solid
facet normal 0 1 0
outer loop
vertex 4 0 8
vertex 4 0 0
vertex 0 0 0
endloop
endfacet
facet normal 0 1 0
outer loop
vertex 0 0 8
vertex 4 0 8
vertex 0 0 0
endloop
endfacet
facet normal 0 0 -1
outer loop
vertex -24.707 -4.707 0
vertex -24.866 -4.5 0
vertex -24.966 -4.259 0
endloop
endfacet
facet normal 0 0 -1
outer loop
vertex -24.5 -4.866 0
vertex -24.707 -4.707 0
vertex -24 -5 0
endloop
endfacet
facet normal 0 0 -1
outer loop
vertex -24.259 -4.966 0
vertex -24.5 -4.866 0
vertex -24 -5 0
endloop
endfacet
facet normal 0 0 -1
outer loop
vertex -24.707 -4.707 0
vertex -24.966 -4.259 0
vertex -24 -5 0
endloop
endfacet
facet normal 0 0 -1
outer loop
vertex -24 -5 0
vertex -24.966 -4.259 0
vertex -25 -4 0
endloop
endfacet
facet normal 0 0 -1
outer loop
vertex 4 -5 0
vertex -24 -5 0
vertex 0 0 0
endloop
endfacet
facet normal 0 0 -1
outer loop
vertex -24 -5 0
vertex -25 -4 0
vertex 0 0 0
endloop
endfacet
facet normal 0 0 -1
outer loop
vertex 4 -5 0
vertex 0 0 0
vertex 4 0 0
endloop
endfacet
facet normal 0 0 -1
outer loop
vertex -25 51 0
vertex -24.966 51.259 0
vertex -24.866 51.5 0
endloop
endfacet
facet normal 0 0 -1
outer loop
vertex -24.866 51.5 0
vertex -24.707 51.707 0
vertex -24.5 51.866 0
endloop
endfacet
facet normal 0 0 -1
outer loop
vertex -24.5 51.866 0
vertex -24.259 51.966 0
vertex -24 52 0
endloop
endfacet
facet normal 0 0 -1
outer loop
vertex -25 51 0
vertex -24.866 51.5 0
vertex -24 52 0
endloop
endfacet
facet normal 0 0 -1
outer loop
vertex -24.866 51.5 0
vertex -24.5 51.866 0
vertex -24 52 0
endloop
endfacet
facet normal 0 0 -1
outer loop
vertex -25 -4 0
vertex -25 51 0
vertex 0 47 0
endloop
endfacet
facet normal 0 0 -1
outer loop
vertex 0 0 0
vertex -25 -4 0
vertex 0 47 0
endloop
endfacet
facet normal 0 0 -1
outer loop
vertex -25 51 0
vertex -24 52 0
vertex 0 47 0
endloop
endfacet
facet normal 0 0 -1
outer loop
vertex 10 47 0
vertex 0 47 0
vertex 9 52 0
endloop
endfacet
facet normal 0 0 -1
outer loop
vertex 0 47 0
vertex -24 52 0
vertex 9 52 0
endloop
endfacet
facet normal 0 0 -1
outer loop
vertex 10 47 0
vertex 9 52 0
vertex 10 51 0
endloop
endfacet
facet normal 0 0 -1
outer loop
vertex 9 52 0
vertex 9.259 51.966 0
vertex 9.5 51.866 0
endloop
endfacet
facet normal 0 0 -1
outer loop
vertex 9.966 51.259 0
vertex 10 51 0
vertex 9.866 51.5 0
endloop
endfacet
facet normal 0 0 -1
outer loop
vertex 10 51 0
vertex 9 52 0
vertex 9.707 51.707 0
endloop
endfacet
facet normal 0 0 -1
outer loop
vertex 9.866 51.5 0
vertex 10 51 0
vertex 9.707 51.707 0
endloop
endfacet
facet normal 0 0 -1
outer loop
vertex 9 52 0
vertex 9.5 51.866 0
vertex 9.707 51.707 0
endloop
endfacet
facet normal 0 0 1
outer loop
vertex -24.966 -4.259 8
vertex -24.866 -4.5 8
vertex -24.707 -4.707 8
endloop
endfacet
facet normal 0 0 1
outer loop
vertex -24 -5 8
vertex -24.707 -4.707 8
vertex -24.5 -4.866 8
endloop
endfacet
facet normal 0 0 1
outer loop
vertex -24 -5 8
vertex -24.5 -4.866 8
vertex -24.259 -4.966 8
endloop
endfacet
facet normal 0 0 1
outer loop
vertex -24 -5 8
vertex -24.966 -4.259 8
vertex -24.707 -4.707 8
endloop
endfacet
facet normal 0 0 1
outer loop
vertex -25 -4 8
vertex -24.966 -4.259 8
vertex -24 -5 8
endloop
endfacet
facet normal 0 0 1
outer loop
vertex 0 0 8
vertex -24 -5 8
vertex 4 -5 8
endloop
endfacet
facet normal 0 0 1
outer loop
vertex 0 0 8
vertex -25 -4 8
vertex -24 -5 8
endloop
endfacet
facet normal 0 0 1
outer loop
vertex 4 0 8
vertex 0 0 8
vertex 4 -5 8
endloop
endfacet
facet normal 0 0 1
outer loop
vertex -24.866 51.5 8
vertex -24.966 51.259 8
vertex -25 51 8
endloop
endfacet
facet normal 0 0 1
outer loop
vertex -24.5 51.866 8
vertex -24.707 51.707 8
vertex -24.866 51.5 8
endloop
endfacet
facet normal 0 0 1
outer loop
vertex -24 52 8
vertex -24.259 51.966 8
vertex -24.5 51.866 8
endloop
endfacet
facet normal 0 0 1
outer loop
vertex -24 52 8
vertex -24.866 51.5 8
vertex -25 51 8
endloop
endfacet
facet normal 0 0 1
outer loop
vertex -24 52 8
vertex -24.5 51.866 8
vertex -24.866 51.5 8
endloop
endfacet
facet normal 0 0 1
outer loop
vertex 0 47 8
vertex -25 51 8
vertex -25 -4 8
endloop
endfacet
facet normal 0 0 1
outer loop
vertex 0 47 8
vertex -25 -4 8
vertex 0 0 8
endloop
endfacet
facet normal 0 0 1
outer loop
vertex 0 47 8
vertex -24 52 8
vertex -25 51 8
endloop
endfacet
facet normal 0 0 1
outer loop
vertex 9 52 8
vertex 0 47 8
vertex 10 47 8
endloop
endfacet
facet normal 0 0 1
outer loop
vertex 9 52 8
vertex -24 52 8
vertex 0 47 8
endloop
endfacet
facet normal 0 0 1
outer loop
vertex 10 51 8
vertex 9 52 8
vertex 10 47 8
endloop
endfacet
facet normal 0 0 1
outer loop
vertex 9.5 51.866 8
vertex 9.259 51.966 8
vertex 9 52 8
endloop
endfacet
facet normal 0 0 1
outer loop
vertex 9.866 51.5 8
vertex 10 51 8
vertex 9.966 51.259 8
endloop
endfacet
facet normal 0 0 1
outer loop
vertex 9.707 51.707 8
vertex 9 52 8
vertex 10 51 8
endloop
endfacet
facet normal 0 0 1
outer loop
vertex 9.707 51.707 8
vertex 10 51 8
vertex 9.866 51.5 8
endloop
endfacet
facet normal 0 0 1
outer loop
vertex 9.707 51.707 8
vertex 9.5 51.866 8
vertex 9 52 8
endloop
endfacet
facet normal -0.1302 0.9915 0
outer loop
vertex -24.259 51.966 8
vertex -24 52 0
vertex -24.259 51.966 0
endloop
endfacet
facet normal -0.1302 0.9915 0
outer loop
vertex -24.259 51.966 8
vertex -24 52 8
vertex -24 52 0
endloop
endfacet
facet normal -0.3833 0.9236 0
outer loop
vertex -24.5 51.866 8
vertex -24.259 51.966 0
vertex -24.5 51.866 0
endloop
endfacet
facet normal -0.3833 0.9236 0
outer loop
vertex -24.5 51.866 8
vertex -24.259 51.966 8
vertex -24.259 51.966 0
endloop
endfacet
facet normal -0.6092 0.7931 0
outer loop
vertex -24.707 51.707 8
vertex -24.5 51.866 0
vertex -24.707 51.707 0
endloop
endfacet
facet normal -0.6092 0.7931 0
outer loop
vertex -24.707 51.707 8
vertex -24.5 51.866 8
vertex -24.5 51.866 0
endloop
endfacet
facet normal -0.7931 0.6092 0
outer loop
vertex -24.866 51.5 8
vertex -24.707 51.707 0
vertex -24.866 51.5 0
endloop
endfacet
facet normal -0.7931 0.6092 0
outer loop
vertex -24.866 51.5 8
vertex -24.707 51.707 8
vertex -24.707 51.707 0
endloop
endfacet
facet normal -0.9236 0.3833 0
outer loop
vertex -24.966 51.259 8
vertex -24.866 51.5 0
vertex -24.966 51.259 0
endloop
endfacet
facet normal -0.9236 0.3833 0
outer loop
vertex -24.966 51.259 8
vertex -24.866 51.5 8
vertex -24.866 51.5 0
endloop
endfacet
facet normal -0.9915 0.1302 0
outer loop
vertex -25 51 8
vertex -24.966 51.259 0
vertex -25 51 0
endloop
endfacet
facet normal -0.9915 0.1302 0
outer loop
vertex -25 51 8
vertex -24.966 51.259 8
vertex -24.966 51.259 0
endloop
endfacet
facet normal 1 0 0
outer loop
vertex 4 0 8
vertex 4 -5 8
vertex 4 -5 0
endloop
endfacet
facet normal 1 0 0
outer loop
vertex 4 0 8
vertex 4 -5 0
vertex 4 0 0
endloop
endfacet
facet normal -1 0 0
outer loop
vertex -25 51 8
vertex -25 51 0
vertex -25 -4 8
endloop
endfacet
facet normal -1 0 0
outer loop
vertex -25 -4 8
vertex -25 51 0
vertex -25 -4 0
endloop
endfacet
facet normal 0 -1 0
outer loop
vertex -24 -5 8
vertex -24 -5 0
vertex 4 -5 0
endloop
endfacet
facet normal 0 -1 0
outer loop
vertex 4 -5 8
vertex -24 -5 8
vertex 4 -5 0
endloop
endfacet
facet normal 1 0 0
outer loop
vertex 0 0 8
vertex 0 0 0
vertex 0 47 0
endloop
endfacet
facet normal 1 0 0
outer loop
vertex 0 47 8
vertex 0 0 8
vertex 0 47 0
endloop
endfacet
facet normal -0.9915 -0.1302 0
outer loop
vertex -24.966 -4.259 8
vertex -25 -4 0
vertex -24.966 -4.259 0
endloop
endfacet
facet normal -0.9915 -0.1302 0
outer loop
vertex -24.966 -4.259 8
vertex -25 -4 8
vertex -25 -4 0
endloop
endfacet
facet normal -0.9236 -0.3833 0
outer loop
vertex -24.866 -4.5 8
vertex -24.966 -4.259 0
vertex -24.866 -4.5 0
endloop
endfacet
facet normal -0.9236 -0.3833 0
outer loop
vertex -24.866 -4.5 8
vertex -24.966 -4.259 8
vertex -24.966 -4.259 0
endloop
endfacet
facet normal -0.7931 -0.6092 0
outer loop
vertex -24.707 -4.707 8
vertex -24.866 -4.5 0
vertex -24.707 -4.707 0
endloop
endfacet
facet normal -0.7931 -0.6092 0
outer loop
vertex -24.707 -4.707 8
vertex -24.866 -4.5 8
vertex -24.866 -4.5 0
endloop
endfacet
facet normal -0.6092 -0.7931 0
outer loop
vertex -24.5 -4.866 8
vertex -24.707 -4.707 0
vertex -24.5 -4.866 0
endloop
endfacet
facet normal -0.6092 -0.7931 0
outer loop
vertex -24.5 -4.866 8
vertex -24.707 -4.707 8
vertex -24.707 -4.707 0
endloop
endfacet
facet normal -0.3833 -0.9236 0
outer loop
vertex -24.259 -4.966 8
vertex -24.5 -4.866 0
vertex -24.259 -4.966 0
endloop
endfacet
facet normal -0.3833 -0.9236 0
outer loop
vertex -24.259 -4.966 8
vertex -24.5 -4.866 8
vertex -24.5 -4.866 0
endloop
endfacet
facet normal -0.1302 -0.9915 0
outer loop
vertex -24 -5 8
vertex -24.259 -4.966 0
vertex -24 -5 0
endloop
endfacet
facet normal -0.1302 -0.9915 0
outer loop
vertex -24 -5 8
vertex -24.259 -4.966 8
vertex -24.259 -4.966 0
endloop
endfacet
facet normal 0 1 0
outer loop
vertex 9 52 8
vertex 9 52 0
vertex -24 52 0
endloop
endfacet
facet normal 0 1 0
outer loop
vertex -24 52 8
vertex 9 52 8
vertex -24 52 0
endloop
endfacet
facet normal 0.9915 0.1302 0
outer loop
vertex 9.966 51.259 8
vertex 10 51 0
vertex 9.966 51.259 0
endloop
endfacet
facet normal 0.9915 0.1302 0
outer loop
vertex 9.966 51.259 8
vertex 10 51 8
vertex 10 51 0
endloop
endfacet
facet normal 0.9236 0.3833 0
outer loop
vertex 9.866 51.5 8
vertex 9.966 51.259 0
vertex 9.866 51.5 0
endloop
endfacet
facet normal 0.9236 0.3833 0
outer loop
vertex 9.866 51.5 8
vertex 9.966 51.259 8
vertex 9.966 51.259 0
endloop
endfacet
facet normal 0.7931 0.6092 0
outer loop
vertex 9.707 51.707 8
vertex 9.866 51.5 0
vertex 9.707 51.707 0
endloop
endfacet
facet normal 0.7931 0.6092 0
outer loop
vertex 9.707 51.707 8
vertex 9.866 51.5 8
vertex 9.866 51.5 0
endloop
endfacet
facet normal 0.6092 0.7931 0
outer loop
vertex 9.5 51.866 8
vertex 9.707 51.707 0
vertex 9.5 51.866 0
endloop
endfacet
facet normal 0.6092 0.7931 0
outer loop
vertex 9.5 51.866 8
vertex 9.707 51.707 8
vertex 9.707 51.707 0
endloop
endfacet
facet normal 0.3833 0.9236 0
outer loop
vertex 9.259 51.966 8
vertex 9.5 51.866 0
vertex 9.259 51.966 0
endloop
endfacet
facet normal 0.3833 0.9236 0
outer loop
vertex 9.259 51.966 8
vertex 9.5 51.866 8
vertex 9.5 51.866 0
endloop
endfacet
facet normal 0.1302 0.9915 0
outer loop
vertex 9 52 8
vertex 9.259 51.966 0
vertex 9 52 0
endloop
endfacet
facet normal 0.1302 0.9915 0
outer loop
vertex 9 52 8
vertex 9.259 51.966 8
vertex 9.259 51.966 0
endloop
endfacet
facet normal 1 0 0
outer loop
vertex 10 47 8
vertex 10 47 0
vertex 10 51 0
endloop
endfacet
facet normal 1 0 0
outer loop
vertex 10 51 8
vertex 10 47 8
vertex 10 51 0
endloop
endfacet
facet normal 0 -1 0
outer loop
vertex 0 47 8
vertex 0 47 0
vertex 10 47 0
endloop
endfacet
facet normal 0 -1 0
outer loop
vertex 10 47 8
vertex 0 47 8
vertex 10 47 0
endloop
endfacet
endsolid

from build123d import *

# Parameters (mm, degrees)
PAD_DEPTH = 8
FILLET_R  = 1


with BuildPart() as part:
    # Sketch → Pad (new body)
    with BuildSketch(Plane.XY):
        Polygon((0, 0), (0, 47), (10, 47), (10, 52), (-25, 52), (-25, -5), (4, -5), (4, 0), align=None)
    extrude(amount=PAD_DEPTH)

    # Fillet
    fillet_edges = [part.edges().sort_by_distance(p)[0] for p in [
        (-25, 52, 4),
        (-25, -5, 4),
        (10, 52, 4),
    ]]
    fillet(fillet_edges, radius=FILLET_R)


solid = part.part
